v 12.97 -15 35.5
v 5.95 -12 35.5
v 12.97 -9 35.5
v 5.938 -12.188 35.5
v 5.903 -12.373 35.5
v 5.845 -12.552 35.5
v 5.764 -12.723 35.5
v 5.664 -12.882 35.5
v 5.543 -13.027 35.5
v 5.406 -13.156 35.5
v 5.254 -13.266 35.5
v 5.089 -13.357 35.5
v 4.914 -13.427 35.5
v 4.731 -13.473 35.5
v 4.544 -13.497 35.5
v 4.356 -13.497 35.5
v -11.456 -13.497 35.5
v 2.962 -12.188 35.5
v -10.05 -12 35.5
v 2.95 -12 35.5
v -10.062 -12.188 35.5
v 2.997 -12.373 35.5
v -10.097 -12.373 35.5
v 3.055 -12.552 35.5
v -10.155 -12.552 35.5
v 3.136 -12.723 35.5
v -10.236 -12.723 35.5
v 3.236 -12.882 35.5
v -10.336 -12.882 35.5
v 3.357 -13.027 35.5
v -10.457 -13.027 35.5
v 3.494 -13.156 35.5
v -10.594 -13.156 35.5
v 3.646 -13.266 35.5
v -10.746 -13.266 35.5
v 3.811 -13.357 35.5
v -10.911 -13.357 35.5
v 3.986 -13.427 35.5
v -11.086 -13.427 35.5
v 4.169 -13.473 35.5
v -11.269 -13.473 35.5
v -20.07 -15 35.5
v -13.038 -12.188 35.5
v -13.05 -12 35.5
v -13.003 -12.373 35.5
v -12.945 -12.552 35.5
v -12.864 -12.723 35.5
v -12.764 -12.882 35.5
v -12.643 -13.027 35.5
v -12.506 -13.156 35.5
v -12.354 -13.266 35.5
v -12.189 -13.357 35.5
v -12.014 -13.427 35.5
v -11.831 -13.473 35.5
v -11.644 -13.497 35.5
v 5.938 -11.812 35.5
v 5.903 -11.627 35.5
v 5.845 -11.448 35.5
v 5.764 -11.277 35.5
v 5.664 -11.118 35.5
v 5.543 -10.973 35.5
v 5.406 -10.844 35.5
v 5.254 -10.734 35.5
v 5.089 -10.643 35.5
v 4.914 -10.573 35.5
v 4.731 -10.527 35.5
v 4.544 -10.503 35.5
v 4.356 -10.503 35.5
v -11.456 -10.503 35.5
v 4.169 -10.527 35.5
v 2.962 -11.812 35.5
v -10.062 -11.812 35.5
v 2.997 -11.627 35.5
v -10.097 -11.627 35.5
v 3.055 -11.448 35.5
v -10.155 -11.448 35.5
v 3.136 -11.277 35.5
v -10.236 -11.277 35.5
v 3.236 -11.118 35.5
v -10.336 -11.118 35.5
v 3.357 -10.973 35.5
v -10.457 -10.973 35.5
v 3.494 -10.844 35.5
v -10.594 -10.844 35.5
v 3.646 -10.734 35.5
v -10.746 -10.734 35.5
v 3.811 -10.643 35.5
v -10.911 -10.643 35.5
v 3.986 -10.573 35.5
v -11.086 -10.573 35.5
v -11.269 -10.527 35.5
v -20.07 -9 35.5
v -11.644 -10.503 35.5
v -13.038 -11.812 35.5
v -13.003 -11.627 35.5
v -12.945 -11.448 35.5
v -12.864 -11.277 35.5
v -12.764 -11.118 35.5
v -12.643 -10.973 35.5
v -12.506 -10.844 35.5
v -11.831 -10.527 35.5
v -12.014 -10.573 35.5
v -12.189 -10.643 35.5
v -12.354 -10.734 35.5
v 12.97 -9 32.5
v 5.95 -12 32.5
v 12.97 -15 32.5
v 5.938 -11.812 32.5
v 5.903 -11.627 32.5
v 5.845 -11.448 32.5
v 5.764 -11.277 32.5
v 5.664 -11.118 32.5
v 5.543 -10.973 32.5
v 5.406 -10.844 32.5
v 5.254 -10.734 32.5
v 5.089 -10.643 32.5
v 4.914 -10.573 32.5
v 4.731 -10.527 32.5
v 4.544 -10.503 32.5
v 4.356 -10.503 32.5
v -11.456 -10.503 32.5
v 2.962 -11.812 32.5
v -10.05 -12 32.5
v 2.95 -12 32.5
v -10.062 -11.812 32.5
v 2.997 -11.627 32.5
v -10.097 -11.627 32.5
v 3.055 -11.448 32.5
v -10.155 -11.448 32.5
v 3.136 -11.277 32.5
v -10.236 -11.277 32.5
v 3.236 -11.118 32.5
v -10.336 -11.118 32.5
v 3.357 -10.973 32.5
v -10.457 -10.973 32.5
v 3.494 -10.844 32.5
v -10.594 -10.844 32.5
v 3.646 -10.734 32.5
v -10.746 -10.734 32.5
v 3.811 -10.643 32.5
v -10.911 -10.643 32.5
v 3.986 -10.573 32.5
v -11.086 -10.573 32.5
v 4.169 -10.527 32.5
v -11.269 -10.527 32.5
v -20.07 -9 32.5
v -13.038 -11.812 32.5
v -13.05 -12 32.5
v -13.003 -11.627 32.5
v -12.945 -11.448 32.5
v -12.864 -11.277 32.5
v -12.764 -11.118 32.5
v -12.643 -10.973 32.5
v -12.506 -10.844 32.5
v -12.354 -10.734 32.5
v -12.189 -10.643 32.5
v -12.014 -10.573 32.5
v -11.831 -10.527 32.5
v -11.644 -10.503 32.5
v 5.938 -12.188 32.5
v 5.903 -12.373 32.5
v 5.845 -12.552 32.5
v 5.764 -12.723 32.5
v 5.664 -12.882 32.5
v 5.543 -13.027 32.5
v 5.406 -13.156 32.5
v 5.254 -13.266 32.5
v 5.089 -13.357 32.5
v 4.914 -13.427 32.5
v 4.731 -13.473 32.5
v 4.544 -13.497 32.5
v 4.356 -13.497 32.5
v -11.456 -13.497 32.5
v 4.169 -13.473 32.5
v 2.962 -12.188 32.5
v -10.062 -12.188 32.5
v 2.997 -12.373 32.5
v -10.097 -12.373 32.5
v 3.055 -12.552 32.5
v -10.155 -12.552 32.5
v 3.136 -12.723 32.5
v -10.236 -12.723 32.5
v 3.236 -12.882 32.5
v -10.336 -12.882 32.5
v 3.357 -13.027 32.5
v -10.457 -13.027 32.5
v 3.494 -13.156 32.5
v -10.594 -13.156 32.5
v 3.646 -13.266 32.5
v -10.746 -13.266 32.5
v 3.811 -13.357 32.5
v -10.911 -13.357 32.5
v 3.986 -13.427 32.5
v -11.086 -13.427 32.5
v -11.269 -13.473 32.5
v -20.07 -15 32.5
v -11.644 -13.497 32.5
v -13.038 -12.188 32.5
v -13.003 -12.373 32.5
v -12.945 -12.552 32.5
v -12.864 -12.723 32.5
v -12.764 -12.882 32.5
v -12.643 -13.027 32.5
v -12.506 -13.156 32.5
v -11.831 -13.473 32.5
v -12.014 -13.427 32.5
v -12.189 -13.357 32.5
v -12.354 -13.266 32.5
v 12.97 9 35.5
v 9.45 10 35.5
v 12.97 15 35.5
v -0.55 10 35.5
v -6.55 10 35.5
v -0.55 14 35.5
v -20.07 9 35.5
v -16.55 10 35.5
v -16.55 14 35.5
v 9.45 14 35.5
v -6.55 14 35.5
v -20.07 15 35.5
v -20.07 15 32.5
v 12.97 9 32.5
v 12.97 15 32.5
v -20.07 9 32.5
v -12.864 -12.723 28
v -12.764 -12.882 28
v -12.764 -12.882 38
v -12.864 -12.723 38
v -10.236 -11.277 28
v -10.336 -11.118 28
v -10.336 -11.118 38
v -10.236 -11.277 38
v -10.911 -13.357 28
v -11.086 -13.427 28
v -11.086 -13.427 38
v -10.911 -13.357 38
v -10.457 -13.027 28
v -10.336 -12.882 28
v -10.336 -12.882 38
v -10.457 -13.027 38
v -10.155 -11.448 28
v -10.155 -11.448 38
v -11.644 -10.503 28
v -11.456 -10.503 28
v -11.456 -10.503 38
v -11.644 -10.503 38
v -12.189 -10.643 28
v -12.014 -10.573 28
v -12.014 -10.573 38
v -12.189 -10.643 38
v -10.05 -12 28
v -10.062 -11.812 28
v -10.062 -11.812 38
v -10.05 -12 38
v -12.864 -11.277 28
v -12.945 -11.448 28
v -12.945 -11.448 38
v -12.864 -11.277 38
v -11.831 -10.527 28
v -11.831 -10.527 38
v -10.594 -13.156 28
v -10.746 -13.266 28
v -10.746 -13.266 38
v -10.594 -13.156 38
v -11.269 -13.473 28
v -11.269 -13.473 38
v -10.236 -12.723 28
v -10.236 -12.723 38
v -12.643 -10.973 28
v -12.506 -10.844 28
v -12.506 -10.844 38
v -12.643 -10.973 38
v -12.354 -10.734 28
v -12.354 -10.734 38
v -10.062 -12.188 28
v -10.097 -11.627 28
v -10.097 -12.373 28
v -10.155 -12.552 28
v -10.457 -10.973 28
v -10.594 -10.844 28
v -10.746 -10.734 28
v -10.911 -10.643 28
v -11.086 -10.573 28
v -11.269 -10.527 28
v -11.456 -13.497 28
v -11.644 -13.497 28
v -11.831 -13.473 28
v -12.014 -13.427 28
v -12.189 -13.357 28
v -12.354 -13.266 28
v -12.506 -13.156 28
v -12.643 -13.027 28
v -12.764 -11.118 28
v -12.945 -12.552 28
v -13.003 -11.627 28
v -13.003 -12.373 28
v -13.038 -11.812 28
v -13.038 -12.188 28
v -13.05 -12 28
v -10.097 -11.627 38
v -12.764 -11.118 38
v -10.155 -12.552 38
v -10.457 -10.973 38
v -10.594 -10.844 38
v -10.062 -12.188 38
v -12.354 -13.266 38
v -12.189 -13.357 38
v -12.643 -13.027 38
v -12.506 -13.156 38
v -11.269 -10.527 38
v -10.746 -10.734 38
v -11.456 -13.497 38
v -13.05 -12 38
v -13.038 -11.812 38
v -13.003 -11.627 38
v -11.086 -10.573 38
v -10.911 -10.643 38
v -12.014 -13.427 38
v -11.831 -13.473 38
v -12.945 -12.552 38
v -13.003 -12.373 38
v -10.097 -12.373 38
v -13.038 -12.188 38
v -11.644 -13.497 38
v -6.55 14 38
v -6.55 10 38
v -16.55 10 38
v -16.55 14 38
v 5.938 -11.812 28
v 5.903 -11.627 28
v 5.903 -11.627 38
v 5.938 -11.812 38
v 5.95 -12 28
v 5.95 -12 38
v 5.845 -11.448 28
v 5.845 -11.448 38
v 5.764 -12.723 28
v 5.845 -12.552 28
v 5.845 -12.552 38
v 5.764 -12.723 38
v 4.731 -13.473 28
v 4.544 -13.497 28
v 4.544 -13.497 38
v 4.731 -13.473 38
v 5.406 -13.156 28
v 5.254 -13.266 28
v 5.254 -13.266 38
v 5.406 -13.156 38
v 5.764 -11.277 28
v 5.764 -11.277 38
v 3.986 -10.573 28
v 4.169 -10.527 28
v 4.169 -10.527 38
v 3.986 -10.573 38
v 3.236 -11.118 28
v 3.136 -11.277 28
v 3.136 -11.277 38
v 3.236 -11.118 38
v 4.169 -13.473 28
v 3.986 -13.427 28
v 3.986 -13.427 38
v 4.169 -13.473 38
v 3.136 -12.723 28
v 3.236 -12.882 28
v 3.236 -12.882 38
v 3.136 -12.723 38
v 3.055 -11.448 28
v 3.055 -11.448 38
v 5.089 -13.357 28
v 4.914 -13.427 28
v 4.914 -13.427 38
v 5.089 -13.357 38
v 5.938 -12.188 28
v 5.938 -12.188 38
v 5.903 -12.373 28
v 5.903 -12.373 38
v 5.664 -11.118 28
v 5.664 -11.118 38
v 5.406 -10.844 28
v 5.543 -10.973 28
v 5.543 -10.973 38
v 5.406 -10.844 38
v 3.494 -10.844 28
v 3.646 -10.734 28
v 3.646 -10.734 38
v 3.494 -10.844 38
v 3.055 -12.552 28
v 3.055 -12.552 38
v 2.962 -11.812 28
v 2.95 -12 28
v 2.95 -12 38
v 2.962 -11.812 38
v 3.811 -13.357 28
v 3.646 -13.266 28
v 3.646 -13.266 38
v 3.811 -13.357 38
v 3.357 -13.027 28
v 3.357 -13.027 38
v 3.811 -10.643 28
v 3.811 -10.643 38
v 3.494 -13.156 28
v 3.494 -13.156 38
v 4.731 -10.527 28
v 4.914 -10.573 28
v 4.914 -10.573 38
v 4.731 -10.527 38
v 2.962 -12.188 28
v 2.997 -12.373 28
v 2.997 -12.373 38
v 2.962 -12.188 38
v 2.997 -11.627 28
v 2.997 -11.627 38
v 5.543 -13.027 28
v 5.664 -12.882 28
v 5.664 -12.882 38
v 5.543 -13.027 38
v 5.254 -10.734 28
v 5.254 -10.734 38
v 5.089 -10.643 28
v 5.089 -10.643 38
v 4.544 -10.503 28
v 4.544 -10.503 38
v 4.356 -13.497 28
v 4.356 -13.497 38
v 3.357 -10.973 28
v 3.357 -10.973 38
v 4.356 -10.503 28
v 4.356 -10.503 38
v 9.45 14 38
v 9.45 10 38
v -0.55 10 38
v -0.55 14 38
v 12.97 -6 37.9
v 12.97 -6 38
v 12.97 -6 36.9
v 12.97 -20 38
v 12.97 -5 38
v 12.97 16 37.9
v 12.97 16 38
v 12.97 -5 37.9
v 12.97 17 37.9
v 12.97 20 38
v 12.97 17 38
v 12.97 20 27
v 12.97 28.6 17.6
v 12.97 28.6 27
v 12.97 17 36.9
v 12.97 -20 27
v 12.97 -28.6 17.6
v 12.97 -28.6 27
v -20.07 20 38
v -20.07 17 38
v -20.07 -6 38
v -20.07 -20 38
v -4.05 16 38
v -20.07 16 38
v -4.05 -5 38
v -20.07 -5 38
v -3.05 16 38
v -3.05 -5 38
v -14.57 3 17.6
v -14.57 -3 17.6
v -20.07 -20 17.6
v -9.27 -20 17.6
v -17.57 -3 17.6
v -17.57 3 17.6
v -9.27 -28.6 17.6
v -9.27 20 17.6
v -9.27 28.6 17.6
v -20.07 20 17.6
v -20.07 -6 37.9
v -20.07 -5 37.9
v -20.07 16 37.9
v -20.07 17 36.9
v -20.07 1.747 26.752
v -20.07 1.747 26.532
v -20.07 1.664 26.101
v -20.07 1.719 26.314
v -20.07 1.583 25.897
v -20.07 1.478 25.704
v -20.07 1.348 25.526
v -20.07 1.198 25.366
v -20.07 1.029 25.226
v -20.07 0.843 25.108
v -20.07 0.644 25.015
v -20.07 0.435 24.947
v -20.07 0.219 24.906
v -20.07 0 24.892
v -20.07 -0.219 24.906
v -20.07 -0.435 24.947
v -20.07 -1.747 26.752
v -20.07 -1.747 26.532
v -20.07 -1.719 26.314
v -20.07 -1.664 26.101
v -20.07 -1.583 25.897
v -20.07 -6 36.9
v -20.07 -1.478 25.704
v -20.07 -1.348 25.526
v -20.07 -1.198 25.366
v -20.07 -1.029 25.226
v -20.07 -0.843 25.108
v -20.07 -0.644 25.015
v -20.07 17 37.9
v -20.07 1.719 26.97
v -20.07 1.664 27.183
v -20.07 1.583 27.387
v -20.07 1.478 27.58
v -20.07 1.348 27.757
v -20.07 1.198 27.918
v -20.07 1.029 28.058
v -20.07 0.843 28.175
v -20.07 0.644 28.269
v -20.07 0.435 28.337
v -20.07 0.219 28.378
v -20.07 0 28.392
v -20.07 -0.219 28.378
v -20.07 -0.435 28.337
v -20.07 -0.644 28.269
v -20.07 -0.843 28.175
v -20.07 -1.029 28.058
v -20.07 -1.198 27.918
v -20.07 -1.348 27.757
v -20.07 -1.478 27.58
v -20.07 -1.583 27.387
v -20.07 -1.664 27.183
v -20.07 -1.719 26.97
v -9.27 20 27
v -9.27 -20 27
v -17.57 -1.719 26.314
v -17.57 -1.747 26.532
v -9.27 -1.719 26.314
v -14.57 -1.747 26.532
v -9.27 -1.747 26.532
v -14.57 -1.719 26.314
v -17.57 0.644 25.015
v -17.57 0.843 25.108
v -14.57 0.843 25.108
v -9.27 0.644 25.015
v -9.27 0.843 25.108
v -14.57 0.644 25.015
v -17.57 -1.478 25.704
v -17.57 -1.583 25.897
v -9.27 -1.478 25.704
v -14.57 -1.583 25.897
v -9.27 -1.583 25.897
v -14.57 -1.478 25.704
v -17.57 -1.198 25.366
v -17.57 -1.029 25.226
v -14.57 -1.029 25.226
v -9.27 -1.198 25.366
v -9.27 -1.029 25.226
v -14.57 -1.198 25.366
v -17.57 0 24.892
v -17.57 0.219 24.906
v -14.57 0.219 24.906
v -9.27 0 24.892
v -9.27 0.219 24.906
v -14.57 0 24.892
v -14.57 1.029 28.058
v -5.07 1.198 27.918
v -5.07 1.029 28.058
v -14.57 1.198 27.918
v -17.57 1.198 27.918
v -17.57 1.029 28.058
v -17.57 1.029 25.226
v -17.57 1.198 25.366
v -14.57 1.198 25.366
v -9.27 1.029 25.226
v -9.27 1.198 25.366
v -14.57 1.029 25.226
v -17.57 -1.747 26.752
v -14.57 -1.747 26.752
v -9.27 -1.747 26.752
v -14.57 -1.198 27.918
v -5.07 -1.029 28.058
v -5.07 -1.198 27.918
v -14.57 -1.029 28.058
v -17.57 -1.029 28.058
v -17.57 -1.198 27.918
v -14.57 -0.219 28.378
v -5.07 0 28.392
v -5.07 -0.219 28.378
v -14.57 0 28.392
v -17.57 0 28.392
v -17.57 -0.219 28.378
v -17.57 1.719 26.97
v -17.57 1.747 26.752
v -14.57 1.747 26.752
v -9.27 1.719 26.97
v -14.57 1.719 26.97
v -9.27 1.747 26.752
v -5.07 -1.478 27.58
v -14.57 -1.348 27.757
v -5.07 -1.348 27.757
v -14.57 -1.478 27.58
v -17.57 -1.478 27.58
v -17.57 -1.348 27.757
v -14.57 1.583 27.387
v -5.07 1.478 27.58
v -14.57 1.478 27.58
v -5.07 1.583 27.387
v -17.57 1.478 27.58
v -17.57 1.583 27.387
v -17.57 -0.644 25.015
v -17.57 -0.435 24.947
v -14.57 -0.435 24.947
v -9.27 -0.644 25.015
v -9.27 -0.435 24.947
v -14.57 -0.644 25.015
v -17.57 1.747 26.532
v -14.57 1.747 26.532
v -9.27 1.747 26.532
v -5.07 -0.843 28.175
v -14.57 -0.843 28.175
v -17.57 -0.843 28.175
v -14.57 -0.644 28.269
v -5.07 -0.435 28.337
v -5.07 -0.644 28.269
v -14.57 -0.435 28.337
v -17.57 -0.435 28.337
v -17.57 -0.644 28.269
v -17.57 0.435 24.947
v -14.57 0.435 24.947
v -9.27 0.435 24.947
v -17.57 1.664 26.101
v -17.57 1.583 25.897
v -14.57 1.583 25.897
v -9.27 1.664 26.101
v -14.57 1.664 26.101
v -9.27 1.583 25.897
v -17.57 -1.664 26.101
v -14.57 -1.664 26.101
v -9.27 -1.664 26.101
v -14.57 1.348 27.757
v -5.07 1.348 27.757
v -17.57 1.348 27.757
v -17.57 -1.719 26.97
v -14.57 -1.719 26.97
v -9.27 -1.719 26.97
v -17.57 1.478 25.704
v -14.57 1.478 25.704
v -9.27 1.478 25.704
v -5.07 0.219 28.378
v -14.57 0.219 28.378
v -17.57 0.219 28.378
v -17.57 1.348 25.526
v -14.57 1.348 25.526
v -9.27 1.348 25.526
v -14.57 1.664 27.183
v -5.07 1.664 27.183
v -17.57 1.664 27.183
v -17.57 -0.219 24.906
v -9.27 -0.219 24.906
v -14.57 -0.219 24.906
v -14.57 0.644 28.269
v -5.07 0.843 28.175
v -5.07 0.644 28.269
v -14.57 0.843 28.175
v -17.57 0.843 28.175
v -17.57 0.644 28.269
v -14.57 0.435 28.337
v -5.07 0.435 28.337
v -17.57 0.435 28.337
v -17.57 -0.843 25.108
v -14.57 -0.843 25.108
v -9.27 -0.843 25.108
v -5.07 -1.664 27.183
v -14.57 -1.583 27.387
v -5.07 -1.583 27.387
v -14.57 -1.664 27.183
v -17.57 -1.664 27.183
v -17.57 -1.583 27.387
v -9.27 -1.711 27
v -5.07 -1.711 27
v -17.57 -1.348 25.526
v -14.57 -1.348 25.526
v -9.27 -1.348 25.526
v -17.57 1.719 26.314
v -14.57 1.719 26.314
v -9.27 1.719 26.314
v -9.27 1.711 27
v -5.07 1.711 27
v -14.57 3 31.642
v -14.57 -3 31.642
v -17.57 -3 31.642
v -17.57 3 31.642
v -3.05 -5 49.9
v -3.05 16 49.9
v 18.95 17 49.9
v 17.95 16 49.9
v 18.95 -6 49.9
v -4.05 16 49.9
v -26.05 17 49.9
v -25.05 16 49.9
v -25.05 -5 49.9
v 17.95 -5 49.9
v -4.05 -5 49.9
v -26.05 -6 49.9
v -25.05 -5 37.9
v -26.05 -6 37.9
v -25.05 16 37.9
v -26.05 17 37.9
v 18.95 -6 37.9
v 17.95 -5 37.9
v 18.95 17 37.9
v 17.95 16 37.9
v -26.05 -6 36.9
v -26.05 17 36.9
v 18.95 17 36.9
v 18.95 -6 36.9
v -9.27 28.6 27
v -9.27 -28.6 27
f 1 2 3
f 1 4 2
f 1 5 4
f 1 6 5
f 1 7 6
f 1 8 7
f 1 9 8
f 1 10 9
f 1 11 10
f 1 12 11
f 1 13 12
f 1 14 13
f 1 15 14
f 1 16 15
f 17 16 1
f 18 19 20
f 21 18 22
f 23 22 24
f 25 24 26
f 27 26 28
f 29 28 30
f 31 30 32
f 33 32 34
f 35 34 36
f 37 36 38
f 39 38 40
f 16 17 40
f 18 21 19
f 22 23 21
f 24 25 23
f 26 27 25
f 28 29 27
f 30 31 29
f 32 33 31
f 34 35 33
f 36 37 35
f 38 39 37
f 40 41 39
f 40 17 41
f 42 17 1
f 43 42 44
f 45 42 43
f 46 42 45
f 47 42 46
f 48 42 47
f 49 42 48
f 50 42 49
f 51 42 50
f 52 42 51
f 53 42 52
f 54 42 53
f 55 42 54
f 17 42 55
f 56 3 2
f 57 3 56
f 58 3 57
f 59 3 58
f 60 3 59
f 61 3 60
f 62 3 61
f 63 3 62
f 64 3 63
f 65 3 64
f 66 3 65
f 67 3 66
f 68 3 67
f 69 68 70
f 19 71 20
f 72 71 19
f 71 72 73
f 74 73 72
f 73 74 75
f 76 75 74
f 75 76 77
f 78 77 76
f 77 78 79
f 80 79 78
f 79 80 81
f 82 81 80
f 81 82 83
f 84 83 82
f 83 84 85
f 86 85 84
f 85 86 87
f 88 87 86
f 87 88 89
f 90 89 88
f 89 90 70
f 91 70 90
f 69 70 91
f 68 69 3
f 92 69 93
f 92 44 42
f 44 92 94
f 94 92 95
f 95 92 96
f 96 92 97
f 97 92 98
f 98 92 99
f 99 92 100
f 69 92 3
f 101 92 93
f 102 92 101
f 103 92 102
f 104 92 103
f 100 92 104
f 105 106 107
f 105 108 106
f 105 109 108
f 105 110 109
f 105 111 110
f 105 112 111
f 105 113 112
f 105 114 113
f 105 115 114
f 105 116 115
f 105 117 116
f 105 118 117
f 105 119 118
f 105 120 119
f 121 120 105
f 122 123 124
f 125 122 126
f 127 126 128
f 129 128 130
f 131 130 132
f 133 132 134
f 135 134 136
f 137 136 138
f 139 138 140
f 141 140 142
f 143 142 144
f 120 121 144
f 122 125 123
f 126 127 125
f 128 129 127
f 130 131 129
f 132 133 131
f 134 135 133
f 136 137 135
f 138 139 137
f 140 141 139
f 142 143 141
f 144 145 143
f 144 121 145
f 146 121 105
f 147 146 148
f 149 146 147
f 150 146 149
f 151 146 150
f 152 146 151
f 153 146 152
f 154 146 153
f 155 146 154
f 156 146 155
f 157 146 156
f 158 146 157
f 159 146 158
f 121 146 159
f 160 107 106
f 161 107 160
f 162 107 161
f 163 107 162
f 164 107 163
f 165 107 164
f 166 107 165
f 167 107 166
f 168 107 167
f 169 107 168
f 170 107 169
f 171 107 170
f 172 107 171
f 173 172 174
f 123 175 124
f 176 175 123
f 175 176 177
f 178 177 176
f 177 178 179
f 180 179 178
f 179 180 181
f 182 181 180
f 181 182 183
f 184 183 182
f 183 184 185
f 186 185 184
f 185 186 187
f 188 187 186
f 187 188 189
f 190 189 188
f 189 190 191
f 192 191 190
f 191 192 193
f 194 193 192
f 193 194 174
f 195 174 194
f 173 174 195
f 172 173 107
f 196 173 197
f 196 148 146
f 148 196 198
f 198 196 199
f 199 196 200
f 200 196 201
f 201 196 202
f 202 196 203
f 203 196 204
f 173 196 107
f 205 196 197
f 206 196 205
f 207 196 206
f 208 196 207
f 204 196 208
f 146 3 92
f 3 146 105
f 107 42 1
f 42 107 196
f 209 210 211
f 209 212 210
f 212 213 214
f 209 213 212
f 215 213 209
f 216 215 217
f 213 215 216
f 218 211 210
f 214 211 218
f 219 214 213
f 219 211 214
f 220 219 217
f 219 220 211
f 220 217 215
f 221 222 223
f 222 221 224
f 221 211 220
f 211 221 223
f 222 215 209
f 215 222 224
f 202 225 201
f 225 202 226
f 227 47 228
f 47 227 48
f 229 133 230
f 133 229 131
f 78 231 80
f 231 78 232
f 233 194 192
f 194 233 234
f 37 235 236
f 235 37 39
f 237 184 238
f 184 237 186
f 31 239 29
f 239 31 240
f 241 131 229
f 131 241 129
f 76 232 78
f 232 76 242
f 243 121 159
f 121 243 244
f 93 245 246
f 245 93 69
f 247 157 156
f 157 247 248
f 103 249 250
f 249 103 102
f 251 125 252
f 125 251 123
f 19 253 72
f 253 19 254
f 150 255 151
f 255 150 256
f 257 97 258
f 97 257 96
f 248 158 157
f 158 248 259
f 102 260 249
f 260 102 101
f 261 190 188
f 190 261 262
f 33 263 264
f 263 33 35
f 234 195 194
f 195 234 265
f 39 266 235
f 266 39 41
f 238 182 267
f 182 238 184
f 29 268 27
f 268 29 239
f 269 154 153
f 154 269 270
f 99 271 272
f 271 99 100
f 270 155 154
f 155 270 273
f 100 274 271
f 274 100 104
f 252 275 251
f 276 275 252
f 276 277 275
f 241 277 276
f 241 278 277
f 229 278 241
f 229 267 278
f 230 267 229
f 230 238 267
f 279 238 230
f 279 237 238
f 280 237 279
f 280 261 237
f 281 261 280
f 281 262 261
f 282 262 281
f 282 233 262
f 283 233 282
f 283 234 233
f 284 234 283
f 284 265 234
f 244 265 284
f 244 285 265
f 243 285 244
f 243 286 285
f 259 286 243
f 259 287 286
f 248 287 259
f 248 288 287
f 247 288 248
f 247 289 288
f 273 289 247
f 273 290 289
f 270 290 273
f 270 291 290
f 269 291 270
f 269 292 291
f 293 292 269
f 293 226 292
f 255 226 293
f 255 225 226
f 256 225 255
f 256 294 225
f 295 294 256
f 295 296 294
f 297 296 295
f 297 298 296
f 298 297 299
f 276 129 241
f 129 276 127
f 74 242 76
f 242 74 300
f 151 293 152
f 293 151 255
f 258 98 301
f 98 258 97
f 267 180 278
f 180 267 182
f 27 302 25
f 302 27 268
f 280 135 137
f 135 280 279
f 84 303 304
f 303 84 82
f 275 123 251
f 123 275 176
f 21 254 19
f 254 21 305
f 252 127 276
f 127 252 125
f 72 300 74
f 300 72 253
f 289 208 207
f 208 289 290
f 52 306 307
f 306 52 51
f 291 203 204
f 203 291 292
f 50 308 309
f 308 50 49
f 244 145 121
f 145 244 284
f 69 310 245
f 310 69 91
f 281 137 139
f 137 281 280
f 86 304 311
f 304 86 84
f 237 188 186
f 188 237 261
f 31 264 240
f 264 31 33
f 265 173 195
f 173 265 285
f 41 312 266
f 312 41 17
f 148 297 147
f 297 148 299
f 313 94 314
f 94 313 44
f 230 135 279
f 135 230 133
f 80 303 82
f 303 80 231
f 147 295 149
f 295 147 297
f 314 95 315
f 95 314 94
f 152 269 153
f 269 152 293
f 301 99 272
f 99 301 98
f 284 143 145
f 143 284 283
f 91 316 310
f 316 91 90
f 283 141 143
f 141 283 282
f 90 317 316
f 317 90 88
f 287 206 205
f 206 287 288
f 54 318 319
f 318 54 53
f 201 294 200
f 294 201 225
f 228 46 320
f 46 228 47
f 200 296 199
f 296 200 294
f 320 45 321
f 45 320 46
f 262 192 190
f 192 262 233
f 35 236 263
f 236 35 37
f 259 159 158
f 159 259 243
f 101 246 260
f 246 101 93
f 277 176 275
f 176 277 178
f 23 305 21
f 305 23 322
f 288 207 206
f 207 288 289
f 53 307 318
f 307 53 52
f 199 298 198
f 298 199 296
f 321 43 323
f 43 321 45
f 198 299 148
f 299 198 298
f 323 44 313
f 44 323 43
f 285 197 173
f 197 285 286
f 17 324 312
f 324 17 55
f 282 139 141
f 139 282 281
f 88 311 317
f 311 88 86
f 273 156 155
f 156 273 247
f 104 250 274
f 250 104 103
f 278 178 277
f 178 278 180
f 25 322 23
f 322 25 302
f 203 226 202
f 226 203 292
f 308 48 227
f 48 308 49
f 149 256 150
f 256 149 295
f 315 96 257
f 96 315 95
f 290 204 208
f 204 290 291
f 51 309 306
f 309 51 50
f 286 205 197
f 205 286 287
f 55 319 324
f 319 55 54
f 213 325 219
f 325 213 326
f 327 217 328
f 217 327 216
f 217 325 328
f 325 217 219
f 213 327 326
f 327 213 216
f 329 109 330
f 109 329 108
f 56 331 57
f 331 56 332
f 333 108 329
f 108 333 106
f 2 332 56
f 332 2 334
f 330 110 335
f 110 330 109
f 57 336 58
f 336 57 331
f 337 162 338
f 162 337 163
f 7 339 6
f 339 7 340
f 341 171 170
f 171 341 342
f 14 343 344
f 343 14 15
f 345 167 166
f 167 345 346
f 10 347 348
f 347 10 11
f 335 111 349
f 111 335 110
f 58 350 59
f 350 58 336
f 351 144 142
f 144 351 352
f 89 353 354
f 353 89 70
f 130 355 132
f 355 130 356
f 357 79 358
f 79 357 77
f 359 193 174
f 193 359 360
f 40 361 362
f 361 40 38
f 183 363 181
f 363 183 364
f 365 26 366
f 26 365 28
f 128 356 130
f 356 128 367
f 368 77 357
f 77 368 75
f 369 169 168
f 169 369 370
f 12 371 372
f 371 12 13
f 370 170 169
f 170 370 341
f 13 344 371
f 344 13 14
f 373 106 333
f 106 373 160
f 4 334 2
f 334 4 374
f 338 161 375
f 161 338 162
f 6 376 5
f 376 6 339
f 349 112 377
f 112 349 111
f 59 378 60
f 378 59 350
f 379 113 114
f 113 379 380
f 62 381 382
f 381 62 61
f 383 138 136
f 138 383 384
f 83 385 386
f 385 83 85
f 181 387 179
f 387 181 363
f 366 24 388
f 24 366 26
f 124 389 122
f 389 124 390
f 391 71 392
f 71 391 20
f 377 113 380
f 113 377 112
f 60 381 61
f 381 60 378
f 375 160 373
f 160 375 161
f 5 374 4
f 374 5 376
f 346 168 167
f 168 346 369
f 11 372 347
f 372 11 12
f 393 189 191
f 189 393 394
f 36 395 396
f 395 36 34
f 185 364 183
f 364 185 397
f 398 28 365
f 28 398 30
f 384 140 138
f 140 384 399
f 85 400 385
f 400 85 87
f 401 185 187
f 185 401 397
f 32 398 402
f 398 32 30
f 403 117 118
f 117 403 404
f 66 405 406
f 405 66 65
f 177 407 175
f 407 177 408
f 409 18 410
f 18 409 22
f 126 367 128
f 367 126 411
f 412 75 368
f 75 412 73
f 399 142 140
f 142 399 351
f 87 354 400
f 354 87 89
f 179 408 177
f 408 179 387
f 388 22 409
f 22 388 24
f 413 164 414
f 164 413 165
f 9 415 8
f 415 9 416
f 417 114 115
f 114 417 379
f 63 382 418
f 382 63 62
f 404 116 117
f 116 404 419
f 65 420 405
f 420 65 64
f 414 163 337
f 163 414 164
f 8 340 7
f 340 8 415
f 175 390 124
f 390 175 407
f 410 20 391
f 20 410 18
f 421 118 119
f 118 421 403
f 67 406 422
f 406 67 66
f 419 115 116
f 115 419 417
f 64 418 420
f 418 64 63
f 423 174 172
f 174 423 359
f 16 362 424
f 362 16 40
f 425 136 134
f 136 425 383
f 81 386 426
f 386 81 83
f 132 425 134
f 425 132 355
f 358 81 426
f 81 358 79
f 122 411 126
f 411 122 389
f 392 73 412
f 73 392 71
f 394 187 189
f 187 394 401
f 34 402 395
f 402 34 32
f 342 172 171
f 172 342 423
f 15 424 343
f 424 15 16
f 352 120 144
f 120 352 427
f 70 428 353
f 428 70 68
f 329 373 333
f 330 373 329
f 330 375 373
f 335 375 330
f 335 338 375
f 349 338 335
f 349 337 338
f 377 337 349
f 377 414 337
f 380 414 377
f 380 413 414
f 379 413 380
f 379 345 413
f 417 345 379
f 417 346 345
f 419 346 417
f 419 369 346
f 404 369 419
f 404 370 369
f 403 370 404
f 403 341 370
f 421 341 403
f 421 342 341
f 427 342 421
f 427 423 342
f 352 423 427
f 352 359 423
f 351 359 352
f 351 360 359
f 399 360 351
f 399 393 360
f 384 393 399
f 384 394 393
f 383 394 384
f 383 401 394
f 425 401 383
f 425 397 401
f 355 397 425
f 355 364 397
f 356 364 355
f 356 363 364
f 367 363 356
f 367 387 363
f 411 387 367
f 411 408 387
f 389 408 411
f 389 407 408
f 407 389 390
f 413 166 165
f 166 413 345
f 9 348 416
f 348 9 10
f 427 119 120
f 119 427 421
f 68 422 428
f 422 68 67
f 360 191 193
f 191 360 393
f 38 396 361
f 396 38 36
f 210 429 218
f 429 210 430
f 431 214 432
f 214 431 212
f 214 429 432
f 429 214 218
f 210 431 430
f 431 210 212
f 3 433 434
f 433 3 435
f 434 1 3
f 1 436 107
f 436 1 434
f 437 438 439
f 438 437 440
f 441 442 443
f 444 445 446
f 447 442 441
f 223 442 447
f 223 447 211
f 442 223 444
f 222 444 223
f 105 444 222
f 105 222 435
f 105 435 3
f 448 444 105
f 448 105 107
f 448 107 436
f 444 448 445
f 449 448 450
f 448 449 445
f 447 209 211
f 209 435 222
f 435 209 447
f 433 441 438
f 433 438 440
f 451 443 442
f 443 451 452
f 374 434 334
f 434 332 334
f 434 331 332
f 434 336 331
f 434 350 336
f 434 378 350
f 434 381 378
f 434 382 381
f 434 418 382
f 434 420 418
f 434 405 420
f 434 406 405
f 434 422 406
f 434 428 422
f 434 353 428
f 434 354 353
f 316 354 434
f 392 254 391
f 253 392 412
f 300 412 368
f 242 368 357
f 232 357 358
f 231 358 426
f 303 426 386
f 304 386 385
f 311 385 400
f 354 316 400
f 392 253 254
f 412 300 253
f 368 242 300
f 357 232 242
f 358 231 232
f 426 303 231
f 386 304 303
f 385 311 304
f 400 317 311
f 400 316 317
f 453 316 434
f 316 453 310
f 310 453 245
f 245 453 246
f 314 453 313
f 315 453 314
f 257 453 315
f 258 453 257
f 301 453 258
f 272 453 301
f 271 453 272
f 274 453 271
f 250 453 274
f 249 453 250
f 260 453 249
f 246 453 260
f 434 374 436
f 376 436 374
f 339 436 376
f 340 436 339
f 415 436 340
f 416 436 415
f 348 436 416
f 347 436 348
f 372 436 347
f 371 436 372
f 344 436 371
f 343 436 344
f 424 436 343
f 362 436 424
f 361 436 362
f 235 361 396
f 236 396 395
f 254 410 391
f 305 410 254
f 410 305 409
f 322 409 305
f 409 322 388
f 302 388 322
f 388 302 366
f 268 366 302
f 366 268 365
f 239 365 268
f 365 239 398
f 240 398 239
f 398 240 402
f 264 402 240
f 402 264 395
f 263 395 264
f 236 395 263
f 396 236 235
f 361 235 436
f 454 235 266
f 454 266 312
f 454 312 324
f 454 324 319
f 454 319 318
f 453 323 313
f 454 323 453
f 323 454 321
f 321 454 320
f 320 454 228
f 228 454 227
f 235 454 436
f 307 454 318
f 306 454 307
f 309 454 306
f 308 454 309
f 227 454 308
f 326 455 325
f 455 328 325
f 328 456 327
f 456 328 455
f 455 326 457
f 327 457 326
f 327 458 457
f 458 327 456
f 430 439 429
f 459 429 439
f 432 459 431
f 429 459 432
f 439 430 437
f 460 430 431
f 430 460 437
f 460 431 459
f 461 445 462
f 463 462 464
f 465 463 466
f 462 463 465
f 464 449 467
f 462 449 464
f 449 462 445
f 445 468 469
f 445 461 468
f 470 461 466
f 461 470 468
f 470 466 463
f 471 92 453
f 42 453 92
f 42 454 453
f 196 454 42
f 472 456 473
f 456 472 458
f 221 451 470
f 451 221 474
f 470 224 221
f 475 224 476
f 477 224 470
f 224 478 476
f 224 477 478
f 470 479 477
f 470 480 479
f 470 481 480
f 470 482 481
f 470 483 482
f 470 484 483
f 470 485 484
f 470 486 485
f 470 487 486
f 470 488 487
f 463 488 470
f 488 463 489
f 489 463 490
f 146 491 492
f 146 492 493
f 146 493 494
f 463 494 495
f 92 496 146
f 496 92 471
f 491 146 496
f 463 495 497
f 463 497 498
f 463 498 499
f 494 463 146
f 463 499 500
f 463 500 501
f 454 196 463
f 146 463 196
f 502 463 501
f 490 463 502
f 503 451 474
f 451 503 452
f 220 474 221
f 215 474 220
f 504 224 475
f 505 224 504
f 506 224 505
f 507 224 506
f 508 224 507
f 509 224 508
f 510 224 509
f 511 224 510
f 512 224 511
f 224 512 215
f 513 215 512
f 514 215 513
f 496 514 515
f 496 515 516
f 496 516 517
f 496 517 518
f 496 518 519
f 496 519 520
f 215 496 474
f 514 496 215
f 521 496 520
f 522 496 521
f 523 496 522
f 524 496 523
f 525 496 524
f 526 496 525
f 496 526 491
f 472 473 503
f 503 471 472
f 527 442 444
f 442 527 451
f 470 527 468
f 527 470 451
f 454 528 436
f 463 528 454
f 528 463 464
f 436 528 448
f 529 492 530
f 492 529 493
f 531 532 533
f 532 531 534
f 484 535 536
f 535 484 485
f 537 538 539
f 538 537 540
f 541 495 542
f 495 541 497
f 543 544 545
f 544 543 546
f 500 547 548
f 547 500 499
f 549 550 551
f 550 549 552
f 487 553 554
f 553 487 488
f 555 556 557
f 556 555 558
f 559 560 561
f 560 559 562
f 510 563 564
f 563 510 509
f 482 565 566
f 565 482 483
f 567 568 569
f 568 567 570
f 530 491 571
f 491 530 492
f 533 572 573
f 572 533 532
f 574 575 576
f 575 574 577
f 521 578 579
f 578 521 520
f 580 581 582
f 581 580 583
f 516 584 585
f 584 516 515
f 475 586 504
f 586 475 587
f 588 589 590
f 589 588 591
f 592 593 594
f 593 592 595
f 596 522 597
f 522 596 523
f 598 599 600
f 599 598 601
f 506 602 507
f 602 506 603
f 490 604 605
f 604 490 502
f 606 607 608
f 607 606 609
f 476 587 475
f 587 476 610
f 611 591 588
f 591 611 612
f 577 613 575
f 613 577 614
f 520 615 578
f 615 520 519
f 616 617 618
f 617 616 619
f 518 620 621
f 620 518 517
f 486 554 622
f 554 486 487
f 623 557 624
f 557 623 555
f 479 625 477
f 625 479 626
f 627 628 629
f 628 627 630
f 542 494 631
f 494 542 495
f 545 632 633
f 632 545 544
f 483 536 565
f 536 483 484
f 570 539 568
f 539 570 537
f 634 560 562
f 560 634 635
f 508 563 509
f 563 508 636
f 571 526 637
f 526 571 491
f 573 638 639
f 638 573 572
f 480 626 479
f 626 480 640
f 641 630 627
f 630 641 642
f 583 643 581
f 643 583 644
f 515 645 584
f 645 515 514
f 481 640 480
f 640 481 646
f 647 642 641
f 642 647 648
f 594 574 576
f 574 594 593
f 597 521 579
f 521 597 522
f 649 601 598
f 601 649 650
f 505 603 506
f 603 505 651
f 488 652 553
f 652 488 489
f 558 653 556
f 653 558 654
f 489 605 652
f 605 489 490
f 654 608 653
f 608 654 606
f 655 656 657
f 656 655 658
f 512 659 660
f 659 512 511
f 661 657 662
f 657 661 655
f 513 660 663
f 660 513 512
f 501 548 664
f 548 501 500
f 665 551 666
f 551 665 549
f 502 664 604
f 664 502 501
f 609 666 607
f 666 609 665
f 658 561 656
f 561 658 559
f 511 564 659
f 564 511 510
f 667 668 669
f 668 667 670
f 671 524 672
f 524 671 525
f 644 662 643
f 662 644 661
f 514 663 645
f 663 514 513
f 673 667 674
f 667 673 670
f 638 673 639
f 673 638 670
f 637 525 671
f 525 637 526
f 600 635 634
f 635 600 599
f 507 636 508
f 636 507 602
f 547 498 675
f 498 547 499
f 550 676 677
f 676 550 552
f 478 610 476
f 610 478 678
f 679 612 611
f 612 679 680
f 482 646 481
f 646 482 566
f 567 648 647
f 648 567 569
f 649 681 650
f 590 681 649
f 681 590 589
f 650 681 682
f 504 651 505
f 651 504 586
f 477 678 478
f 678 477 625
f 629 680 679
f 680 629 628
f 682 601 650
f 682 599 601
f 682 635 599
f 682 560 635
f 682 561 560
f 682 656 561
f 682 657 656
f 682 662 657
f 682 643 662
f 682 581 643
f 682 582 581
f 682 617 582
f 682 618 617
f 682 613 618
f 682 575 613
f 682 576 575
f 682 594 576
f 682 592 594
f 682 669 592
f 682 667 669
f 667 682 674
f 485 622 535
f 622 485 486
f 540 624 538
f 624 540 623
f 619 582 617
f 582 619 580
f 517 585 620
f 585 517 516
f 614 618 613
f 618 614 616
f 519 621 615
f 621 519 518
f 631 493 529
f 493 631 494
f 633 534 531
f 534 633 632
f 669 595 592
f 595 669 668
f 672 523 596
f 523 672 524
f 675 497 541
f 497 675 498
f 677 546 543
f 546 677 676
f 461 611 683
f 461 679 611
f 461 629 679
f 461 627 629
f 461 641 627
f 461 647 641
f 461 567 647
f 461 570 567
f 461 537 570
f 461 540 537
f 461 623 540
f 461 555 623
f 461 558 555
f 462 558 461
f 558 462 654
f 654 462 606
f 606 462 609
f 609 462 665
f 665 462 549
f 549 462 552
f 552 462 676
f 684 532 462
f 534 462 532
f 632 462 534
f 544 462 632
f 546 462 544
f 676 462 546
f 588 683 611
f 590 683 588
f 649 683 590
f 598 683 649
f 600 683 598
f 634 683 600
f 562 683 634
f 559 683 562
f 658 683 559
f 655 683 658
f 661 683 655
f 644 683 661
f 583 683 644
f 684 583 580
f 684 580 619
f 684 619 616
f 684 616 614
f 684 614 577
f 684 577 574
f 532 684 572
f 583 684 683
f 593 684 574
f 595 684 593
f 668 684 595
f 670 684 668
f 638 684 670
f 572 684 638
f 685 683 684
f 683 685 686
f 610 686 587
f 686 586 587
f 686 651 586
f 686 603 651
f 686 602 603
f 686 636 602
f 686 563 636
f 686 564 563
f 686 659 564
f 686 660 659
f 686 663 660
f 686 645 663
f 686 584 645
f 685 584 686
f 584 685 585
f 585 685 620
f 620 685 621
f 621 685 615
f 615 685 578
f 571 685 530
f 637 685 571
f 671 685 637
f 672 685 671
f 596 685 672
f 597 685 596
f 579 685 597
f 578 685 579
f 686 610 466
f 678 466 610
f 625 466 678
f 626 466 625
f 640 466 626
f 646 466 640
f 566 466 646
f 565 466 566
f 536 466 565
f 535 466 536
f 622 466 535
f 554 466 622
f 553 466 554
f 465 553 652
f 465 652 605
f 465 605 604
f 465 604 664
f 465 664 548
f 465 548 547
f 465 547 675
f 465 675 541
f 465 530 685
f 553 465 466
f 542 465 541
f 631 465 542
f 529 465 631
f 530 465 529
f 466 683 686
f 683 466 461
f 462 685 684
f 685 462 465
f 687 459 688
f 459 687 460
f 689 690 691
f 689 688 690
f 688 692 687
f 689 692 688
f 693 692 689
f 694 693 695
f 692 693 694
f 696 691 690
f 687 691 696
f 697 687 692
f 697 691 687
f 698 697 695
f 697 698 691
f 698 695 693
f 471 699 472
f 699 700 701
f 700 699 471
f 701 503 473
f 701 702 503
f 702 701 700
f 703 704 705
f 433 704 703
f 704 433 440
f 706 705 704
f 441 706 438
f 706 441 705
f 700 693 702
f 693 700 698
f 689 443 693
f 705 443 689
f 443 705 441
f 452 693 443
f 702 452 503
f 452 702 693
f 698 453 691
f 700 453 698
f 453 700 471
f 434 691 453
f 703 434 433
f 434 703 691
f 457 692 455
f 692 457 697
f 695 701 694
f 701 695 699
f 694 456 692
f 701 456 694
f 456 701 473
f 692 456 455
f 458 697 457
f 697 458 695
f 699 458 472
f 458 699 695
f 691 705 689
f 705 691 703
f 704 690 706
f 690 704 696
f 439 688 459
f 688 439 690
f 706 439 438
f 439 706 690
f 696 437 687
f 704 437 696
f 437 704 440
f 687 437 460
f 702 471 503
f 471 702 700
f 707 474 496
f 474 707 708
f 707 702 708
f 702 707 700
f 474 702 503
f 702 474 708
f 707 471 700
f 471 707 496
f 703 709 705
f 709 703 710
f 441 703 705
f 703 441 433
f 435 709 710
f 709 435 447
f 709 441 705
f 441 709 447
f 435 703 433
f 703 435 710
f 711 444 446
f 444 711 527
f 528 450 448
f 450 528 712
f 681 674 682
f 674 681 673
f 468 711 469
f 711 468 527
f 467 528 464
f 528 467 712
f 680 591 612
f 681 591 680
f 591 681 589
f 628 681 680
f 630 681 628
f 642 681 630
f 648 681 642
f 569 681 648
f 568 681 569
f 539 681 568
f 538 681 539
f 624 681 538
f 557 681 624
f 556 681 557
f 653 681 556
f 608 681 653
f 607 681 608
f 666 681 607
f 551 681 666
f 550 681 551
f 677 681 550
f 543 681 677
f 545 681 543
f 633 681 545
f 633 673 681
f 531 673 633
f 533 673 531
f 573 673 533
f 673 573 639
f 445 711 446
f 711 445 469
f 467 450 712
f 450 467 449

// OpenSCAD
$fn = 50;

render_platform = false;
render_stage = true;
render_solenoid = false;
render_cartridge = false;

// all units in millimeters

solenoid_body_color = "Red";
// dimensions for solenoid at http://www.amazon.com/gp/product/B00DUYPQHU/ref=oh_aui_detailpage_o03_s00?ie=UTF8&psc=1
solenoid_body_height = 30;
solenoid_body_width = 25;
solenoid_body_length = 51;

solenoid_rod_color = "Black";
solenoid_stroke = 7.1;
solenoid_rod_min = 6;

platform_color = "LightBlue";
platform_height = 16;
platform_back_margin = 15;
platform_width = 80;
platform_length = 120;
platform_anchor_tolerance = 0.04;
platform_anchor_r = 3 + platform_anchor_tolerance; // half of d plus 0.04 tolerance
echo("platform_anchor_r = ", platform_anchor_r);
platform_anchor_rk = 9.78 / 2 + platform_anchor_tolerance; // half of dk plus 0.04 tolerance
echo("platform_anchor_rk = ", platform_anchor_rk);
platform_anchor_k = (5.7 + 0.3) * 2; // 0.3mm extra depth, and k is doubled for modeling
echo("platform_anchor_k = ", platform_anchor_k);
platform_anchor_spacing = 50;
platform_anchor_setback = -platform_anchor_spacing / 2;
platform_wiring_slot_length = 4;
platform_wiring_slot_width = 10;
platform_wiring_slot_margin = 4;

teflon_pad_thickness = 0.8;

stage_color = "LightGreen";
stage_elevation = 38;
stage_height = stage_elevation - platform_height - 2 * teflon_pad_thickness;
stage_bevel_radius = 2;
stage_width = 40;

platform_side_width = 10;
echo("platform_side_width = ", platform_side_width);
platform_side_length = platform_anchor_spacing - 2 * platform_anchor_rk;
echo("platform_side_length = ", platform_side_length);
platform_side_height = stage_elevation - platform_height;
echo("platform_side_height = ", platform_side_height);

stage_length = platform_side_length - solenoid_stroke;
echo("stage_length = ", stage_length);

platform_bumper_height = platform_side_height;
echo("platform_bumper_height = ", platform_bumper_height);
platform_bumper_length = 10;
echo("platform_bumper_length = ", platform_bumper_length);
platform_bumper_width = (platform_width - stage_width) / 2 - platform_side_width;
echo("platform_bumper_width = ", platform_bumper_width);

stage_rail_length = stage_length - platform_bumper_length - teflon_pad_thickness;
echo("stage_rail_length = ", stage_rail_length);
stage_rail_width = platform_width - 2 * platform_side_width - 3.5 * teflon_pad_thickness;
echo("stage_rail_width = ", stage_rail_width);
stage_rail_height = 0.5 * platform_side_height - 2 * teflon_pad_thickness;
echo("stage_rail_height = ", stage_rail_height);

platform_rail_width = platform_bumper_width - 2 * teflon_pad_thickness;
echo("platform_rail_width = ", platform_rail_width);
platform_rail_length = platform_side_length - platform_bumper_length;
echo("platform_rail_length = ", platform_rail_length);
platform_rail_height = 0.5 * platform_side_height - 2 * teflon_pad_thickness;
echo("platform_rail_height = ", platform_rail_height);

cartridge_well_width = 8;
cartridge_well_distance_from_centerline = 4;
cartridge_path_width = 1.5;
accessory_x_spacing = 16;
accessory_y_offset = 12;
accessory_x_offset = cartridge_well_width;
echo("accessory_x_offset = ", accessory_x_offset);

solenoid_margin = 0.5;
solenoid_podium_length = solenoid_body_length + 2 * solenoid_margin;
echo("solenoid_podium_length = ", solenoid_podium_length);
solenoid_podium_width = solenoid_body_width + 2 * solenoid_margin;
echo("solenoid_podium_width = ", solenoid_podium_width);

stage_center_of_mass_y = 2 * teflon_pad_thickness + (stage_height * stage_width * stage_length * (stage_height / 2) + 2 * stage_rail_height * (stage_rail_width - stage_width) * stage_rail_length * (stage_rail_height / 2)) / (stage_height * stage_width * stage_length + stage_rail_height * 2 * (stage_rail_width - stage_width) * stage_rail_length);
echo("stage_center_of_mass_y = ", stage_center_of_mass_y);
solenoid_podium_height = stage_center_of_mass_y - solenoid_body_height / 2;
echo("solenoid_podium_height = ", solenoid_podium_height);
echo("solenoid_elevation = ", platform_height + solenoid_podium_height + solenoid_body_height);

if (render_platform) {
	// platform
	color(platform_color) {
		difference() {
			translate([-(platform_length / 2 - platform_anchor_spacing / 2 - platform_back_margin), 0, platform_height / 2])
				cube([platform_length, platform_width, platform_height], center = true);

	// anchor holes
			translate([platform_anchor_spacing + platform_anchor_setback, platform_anchor_spacing / 2, platform_height]) {
				cylinder(r = platform_anchor_r, h = 2 * platform_height, center = true);
				cylinder(r = platform_anchor_rk, h = platform_anchor_k, center = true);
			}
			translate([platform_anchor_setback, -platform_anchor_spacing / 2, platform_height]) {
				cylinder(r = platform_anchor_r, h = 2 * platform_height, center = true);
				cylinder(r = platform_anchor_rk, h = platform_anchor_k, center = true);
			}
			translate([platform_anchor_spacing + platform_anchor_setback, -platform_anchor_spacing / 2, platform_height]) {
				cylinder(r = platform_anchor_r, h = 2 * platform_height, center = true);
				cylinder(r = platform_anchor_rk, h = platform_anchor_k, center = true);
			}
			translate([platform_anchor_setback, platform_anchor_spacing / 2, platform_height]) {
				cylinder(r = platform_anchor_r, h = 2 * platform_height, center = true);
				cylinder(r = platform_anchor_rk, h = platform_anchor_k, center = true);
			}

	// wire terminal holes
			translate([-50, -30, platform_height]) {
				cylinder(r = 1.5, h = 40, center = true);
			}
			translate([-50, -22, platform_height]) {
				cylinder(r = 1.5, h = 40, center = true);
			}

	// wiring access slots
			translate([-(platform_length - platform_back_margin - platform_anchor_spacing / 2 - platform_wiring_slot_length / 2) + platform_wiring_slot_margin, (platform_width - platform_wiring_slot_width) / 2 - platform_wiring_slot_margin, 0]) {
				cube([platform_wiring_slot_length, platform_wiring_slot_width, 2 * platform_height], center = true);
			}

			translate([-(platform_length - platform_back_margin - platform_anchor_spacing / 2 - platform_wiring_slot_length / 2) + platform_wiring_slot_margin, -(platform_width - platform_wiring_slot_width) / 2 + platform_wiring_slot_margin, 0]) {
				cube([platform_wiring_slot_length, platform_wiring_slot_width, 2 * platform_height], center = true);
			}

			translate([platform_back_margin + platform_anchor_spacing / 2 - platform_wiring_slot_length / 2 - platform_wiring_slot_margin, 0, 0]) {
				cube([platform_wiring_slot_length, 2 * platform_wiring_slot_width, 2 * platform_height], center = true);
			}

			if (solenoid_podium_height < 0) {
				translate([-(platform_side_length + solenoid_podium_length) / 2 - solenoid_rod_min + solenoid_margin, 0, platform_height + solenoid_podium_height / 2])
					cube([solenoid_podium_length, solenoid_podium_width, -2 * solenoid_podium_height], center = true);
			}
		}
	}
	
	// platform sides
	color(platform_color) {
		translate([0,  (platform_width - platform_side_width) / 2, platform_height + platform_side_height / 2])
			cube([platform_side_length, platform_side_width, platform_side_height], center = true);
	}
	
	color(platform_color) {
		translate([0, -(platform_width - platform_side_width) / 2, platform_height + platform_side_height / 2])
			cube([platform_side_length, platform_side_width, platform_side_height], center = true);
	}
	
	// platform rails
	color(platform_color) {
		translate([-(platform_side_length - platform_rail_length) / 2 + platform_bumper_length, ((platform_width - platform_rail_width) / 2 - platform_side_width), platform_height + platform_side_height - platform_rail_height / 2])
			cube([platform_rail_length, platform_rail_width, platform_rail_height], center = true);
	}
	
	color(platform_color) {
		translate([-(platform_side_length - platform_rail_length) / 2 + platform_bumper_length,  -((platform_width - platform_rail_width) / 2 - platform_side_width), platform_height + platform_side_height - platform_rail_height / 2])
			cube([platform_rail_length, platform_rail_width, platform_rail_height], center = true);
	}
	
	// platform stage bumper
	color(platform_color) {
		translate([-(platform_side_length - platform_bumper_length) / 2, platform_width / 2 - platform_side_width - platform_rail_width / 2, platform_height + platform_bumper_height / 2])
			cube([platform_bumper_length, platform_rail_width, platform_bumper_height], center = true);
	}
	
	color(platform_color) {
		translate([-(platform_side_length - platform_bumper_length) / 2, -(platform_width / 2 - platform_side_width - platform_rail_width / 2), platform_height + platform_bumper_height / 2])
			cube([platform_bumper_length, platform_rail_width, platform_bumper_height], center = true);
	}
	
	// solenoid podium
	if (solenoid_podium_height > 0) {
		color(platform_color) {
			translate([-(platform_side_length + solenoid_podium_length) / 2, 0, platform_height + solenoid_podium_height / 2])
				cube([solenoid_podium_length, solenoid_podium_width, solenoid_podium_height], center = true);
		}
	}
}

stage_x_offset = (stage_length - platform_side_length) / 2;
echo("stage_x_offset = ", stage_x_offset);
if (render_stage) {
	// stage 
	color(stage_color) {
		difference() {
			translate([stage_x_offset, 0, stage_elevation - stage_height / 2])
				cube([stage_length, stage_width, stage_height], center = true);

	// solenoid rod hole
			translate([-platform_side_length / 2, 0, platform_height + solenoid_podium_height + solenoid_body_height / 2])
				rotate([0, 90, 0]) cylinder(r = 1.75, h = 30, center = true);

	// solenoid rod nut slot
			translate([4 - platform_side_length / 2, 0, platform_height + solenoid_podium_height + solenoid_body_height / 2 - 3])
				cube([3, 6, 16], center = true);

	// accessory hole slots
	
				for (y = [-accessory_y_offset, accessory_y_offset]) {
				translate([0, y, stage_elevation - 4])
					cube([46, 6, 3], center = true);
			}

	// accessory holes
			for (x = [-accessory_x_offset, accessory_x_spacing - accessory_x_offset]) {
			translate([stage_x_offset + x, -accessory_y_offset, stage_elevation])
				cylinder(r = 1.5, h = 20, center = true);
	
			translate([stage_x_offset + x, accessory_y_offset, stage_elevation]) {
				cube([10, 4, 10], center = true);
			}
		}
	}
}

for (x = [-accessory_x_offset, 22 - accessory_x_offset]) {
	translate([stage_x_offset + x - 14.5, accessory_y_offset - 18, stage_elevation - 0.1])
			difference() {
				cube([23, 23, 12]);	
				translate([1, 1, 0]) cube([21, 21, 12]);	
			}
	translate([stage_x_offset - accessory_x_offset - 14.5, accessory_y_offset - 18, stage_elevation - 0.1])
				translate([0, 0, -1]) cube([6, 23, 1]);	
	translate([stage_x_offset + accessory_x_offset + 8.5, accessory_y_offset - 18, stage_elevation - 0.1])
				translate([0, 0, -1]) cube([6, 23, 1]);	
}

	// stage rail
	
	color(stage_color) {
		translate([stage_x_offset + (stage_length - stage_rail_length) / 2, 0, platform_height + 2 * teflon_pad_thickness + stage_rail_height / 2])
			cube([stage_rail_length, stage_rail_width, stage_rail_height], center = true);
	}
}

if (render_solenoid) {
	// solenoid body
	color(solenoid_body_color) {
		translate([-(platform_side_length + solenoid_body_length) / 2 - solenoid_rod_min, 0, platform_height + solenoid_podium_height + solenoid_body_height / 2])
			cube([solenoid_body_length, solenoid_body_width, solenoid_body_height], center = true);
	}
	
	// solenoid rod
	color(solenoid_rod_color) {
		translate([-(platform_side_length + solenoid_stroke) / 2, 0, platform_height + solenoid_podium_height + solenoid_body_height / 2])
		rotate([0, 90, 0])
			cylinder(r = 1, h = solenoid_stroke, center = true);
	}
}

p_y = 1.5; // path width
p_x = 4; // path length
w_x = 6; // well length
w_y = 8; // well width
n = 8; // number of wells 
m = 8; //separation from midline
	
module base_card()
{translate([-5,-20])square([100,40]);}

module corner(f)
{difference(){square([f,f]);circle(r=f,$fn=50);}}

module path()
{union(){
	translate([w_x/2,-w_y/2])square([p_x,p_y]); // actual path
	translate([w_x/2+1,-w_y/2+p_y+1])rotate(180)corner(1);}}//rounded corners

module path2()
{union(){translate([2*w_x+1,-w_y/2])square([p_x,p_y]); // actual path
			 //translate([2*w_x+2,-p_y/2-1])rotate(90)corner(1);
	      translate([2*w_x+2,-w_y/2+1+p_y])rotate(180)corner(1);//rounded corners	
	      //translate([2*w_x+p_x,-p_y/2-1])corner(1);
	      translate([2*w_x+p_x,-w_y/2+1+p_y])rotate(270)corner(1);}}//rounded corners

module well()
{difference ()
	{	square([w_x,w_y], center=true); 
		translate([w_x/2-2,w_y/2-2])corner(2);
		translate([-(w_x/2-2),w_y/2-2])rotate(90)corner(2);
		//translate([-(w_x/2-2),-(w_y/2-2)])rotate(180)corner(2);
		//translate([w_x/2-2,-(w_y/2-2)])rotate(270)corner(2);
   }}

module color_well() // last well
{translate([n*(w_x+p_x)+1,0])
{difference ()
	{	square([w_y,w_y], center=true); 
		translate([w_y/2-2,w_y/2-2])corner(2);
		translate([-(w_y/2-2),w_y/2-2])rotate(90)corner(2);
		//translate([-(w_y/2-2),-(w_y/2-2)])rotate(180)corner(2);
		//translate([w_y/2-2,-(w_y/2-2)])rotate(270)corner(2);
   }}}

module sample_well() // first well
{union(){translate([0,-w_y/2-1])square([2*w_x+1,w_y+2]); path2();}}

module control_well() // first well
{union(){translate([p_x+w_x,0])well(); path2();}}

module set(){union(){color_well(); 
	{for (i =[2:(n-1)]){translate([i*(p_x+w_x),0]){well();path();}}} }} // 1 set of wells, paths and comb
	
if (render_cartridge) {
	translate([0, -20, 45]) rotate(90, 0, 0) linear_extrude(height = 2, center = true)
	difference(){base_card(); 
						translate([0,-m]){sample_well(); set(); square([12,6],center=true);} 
						translate([0,m]){control_well(); set();}}
}
